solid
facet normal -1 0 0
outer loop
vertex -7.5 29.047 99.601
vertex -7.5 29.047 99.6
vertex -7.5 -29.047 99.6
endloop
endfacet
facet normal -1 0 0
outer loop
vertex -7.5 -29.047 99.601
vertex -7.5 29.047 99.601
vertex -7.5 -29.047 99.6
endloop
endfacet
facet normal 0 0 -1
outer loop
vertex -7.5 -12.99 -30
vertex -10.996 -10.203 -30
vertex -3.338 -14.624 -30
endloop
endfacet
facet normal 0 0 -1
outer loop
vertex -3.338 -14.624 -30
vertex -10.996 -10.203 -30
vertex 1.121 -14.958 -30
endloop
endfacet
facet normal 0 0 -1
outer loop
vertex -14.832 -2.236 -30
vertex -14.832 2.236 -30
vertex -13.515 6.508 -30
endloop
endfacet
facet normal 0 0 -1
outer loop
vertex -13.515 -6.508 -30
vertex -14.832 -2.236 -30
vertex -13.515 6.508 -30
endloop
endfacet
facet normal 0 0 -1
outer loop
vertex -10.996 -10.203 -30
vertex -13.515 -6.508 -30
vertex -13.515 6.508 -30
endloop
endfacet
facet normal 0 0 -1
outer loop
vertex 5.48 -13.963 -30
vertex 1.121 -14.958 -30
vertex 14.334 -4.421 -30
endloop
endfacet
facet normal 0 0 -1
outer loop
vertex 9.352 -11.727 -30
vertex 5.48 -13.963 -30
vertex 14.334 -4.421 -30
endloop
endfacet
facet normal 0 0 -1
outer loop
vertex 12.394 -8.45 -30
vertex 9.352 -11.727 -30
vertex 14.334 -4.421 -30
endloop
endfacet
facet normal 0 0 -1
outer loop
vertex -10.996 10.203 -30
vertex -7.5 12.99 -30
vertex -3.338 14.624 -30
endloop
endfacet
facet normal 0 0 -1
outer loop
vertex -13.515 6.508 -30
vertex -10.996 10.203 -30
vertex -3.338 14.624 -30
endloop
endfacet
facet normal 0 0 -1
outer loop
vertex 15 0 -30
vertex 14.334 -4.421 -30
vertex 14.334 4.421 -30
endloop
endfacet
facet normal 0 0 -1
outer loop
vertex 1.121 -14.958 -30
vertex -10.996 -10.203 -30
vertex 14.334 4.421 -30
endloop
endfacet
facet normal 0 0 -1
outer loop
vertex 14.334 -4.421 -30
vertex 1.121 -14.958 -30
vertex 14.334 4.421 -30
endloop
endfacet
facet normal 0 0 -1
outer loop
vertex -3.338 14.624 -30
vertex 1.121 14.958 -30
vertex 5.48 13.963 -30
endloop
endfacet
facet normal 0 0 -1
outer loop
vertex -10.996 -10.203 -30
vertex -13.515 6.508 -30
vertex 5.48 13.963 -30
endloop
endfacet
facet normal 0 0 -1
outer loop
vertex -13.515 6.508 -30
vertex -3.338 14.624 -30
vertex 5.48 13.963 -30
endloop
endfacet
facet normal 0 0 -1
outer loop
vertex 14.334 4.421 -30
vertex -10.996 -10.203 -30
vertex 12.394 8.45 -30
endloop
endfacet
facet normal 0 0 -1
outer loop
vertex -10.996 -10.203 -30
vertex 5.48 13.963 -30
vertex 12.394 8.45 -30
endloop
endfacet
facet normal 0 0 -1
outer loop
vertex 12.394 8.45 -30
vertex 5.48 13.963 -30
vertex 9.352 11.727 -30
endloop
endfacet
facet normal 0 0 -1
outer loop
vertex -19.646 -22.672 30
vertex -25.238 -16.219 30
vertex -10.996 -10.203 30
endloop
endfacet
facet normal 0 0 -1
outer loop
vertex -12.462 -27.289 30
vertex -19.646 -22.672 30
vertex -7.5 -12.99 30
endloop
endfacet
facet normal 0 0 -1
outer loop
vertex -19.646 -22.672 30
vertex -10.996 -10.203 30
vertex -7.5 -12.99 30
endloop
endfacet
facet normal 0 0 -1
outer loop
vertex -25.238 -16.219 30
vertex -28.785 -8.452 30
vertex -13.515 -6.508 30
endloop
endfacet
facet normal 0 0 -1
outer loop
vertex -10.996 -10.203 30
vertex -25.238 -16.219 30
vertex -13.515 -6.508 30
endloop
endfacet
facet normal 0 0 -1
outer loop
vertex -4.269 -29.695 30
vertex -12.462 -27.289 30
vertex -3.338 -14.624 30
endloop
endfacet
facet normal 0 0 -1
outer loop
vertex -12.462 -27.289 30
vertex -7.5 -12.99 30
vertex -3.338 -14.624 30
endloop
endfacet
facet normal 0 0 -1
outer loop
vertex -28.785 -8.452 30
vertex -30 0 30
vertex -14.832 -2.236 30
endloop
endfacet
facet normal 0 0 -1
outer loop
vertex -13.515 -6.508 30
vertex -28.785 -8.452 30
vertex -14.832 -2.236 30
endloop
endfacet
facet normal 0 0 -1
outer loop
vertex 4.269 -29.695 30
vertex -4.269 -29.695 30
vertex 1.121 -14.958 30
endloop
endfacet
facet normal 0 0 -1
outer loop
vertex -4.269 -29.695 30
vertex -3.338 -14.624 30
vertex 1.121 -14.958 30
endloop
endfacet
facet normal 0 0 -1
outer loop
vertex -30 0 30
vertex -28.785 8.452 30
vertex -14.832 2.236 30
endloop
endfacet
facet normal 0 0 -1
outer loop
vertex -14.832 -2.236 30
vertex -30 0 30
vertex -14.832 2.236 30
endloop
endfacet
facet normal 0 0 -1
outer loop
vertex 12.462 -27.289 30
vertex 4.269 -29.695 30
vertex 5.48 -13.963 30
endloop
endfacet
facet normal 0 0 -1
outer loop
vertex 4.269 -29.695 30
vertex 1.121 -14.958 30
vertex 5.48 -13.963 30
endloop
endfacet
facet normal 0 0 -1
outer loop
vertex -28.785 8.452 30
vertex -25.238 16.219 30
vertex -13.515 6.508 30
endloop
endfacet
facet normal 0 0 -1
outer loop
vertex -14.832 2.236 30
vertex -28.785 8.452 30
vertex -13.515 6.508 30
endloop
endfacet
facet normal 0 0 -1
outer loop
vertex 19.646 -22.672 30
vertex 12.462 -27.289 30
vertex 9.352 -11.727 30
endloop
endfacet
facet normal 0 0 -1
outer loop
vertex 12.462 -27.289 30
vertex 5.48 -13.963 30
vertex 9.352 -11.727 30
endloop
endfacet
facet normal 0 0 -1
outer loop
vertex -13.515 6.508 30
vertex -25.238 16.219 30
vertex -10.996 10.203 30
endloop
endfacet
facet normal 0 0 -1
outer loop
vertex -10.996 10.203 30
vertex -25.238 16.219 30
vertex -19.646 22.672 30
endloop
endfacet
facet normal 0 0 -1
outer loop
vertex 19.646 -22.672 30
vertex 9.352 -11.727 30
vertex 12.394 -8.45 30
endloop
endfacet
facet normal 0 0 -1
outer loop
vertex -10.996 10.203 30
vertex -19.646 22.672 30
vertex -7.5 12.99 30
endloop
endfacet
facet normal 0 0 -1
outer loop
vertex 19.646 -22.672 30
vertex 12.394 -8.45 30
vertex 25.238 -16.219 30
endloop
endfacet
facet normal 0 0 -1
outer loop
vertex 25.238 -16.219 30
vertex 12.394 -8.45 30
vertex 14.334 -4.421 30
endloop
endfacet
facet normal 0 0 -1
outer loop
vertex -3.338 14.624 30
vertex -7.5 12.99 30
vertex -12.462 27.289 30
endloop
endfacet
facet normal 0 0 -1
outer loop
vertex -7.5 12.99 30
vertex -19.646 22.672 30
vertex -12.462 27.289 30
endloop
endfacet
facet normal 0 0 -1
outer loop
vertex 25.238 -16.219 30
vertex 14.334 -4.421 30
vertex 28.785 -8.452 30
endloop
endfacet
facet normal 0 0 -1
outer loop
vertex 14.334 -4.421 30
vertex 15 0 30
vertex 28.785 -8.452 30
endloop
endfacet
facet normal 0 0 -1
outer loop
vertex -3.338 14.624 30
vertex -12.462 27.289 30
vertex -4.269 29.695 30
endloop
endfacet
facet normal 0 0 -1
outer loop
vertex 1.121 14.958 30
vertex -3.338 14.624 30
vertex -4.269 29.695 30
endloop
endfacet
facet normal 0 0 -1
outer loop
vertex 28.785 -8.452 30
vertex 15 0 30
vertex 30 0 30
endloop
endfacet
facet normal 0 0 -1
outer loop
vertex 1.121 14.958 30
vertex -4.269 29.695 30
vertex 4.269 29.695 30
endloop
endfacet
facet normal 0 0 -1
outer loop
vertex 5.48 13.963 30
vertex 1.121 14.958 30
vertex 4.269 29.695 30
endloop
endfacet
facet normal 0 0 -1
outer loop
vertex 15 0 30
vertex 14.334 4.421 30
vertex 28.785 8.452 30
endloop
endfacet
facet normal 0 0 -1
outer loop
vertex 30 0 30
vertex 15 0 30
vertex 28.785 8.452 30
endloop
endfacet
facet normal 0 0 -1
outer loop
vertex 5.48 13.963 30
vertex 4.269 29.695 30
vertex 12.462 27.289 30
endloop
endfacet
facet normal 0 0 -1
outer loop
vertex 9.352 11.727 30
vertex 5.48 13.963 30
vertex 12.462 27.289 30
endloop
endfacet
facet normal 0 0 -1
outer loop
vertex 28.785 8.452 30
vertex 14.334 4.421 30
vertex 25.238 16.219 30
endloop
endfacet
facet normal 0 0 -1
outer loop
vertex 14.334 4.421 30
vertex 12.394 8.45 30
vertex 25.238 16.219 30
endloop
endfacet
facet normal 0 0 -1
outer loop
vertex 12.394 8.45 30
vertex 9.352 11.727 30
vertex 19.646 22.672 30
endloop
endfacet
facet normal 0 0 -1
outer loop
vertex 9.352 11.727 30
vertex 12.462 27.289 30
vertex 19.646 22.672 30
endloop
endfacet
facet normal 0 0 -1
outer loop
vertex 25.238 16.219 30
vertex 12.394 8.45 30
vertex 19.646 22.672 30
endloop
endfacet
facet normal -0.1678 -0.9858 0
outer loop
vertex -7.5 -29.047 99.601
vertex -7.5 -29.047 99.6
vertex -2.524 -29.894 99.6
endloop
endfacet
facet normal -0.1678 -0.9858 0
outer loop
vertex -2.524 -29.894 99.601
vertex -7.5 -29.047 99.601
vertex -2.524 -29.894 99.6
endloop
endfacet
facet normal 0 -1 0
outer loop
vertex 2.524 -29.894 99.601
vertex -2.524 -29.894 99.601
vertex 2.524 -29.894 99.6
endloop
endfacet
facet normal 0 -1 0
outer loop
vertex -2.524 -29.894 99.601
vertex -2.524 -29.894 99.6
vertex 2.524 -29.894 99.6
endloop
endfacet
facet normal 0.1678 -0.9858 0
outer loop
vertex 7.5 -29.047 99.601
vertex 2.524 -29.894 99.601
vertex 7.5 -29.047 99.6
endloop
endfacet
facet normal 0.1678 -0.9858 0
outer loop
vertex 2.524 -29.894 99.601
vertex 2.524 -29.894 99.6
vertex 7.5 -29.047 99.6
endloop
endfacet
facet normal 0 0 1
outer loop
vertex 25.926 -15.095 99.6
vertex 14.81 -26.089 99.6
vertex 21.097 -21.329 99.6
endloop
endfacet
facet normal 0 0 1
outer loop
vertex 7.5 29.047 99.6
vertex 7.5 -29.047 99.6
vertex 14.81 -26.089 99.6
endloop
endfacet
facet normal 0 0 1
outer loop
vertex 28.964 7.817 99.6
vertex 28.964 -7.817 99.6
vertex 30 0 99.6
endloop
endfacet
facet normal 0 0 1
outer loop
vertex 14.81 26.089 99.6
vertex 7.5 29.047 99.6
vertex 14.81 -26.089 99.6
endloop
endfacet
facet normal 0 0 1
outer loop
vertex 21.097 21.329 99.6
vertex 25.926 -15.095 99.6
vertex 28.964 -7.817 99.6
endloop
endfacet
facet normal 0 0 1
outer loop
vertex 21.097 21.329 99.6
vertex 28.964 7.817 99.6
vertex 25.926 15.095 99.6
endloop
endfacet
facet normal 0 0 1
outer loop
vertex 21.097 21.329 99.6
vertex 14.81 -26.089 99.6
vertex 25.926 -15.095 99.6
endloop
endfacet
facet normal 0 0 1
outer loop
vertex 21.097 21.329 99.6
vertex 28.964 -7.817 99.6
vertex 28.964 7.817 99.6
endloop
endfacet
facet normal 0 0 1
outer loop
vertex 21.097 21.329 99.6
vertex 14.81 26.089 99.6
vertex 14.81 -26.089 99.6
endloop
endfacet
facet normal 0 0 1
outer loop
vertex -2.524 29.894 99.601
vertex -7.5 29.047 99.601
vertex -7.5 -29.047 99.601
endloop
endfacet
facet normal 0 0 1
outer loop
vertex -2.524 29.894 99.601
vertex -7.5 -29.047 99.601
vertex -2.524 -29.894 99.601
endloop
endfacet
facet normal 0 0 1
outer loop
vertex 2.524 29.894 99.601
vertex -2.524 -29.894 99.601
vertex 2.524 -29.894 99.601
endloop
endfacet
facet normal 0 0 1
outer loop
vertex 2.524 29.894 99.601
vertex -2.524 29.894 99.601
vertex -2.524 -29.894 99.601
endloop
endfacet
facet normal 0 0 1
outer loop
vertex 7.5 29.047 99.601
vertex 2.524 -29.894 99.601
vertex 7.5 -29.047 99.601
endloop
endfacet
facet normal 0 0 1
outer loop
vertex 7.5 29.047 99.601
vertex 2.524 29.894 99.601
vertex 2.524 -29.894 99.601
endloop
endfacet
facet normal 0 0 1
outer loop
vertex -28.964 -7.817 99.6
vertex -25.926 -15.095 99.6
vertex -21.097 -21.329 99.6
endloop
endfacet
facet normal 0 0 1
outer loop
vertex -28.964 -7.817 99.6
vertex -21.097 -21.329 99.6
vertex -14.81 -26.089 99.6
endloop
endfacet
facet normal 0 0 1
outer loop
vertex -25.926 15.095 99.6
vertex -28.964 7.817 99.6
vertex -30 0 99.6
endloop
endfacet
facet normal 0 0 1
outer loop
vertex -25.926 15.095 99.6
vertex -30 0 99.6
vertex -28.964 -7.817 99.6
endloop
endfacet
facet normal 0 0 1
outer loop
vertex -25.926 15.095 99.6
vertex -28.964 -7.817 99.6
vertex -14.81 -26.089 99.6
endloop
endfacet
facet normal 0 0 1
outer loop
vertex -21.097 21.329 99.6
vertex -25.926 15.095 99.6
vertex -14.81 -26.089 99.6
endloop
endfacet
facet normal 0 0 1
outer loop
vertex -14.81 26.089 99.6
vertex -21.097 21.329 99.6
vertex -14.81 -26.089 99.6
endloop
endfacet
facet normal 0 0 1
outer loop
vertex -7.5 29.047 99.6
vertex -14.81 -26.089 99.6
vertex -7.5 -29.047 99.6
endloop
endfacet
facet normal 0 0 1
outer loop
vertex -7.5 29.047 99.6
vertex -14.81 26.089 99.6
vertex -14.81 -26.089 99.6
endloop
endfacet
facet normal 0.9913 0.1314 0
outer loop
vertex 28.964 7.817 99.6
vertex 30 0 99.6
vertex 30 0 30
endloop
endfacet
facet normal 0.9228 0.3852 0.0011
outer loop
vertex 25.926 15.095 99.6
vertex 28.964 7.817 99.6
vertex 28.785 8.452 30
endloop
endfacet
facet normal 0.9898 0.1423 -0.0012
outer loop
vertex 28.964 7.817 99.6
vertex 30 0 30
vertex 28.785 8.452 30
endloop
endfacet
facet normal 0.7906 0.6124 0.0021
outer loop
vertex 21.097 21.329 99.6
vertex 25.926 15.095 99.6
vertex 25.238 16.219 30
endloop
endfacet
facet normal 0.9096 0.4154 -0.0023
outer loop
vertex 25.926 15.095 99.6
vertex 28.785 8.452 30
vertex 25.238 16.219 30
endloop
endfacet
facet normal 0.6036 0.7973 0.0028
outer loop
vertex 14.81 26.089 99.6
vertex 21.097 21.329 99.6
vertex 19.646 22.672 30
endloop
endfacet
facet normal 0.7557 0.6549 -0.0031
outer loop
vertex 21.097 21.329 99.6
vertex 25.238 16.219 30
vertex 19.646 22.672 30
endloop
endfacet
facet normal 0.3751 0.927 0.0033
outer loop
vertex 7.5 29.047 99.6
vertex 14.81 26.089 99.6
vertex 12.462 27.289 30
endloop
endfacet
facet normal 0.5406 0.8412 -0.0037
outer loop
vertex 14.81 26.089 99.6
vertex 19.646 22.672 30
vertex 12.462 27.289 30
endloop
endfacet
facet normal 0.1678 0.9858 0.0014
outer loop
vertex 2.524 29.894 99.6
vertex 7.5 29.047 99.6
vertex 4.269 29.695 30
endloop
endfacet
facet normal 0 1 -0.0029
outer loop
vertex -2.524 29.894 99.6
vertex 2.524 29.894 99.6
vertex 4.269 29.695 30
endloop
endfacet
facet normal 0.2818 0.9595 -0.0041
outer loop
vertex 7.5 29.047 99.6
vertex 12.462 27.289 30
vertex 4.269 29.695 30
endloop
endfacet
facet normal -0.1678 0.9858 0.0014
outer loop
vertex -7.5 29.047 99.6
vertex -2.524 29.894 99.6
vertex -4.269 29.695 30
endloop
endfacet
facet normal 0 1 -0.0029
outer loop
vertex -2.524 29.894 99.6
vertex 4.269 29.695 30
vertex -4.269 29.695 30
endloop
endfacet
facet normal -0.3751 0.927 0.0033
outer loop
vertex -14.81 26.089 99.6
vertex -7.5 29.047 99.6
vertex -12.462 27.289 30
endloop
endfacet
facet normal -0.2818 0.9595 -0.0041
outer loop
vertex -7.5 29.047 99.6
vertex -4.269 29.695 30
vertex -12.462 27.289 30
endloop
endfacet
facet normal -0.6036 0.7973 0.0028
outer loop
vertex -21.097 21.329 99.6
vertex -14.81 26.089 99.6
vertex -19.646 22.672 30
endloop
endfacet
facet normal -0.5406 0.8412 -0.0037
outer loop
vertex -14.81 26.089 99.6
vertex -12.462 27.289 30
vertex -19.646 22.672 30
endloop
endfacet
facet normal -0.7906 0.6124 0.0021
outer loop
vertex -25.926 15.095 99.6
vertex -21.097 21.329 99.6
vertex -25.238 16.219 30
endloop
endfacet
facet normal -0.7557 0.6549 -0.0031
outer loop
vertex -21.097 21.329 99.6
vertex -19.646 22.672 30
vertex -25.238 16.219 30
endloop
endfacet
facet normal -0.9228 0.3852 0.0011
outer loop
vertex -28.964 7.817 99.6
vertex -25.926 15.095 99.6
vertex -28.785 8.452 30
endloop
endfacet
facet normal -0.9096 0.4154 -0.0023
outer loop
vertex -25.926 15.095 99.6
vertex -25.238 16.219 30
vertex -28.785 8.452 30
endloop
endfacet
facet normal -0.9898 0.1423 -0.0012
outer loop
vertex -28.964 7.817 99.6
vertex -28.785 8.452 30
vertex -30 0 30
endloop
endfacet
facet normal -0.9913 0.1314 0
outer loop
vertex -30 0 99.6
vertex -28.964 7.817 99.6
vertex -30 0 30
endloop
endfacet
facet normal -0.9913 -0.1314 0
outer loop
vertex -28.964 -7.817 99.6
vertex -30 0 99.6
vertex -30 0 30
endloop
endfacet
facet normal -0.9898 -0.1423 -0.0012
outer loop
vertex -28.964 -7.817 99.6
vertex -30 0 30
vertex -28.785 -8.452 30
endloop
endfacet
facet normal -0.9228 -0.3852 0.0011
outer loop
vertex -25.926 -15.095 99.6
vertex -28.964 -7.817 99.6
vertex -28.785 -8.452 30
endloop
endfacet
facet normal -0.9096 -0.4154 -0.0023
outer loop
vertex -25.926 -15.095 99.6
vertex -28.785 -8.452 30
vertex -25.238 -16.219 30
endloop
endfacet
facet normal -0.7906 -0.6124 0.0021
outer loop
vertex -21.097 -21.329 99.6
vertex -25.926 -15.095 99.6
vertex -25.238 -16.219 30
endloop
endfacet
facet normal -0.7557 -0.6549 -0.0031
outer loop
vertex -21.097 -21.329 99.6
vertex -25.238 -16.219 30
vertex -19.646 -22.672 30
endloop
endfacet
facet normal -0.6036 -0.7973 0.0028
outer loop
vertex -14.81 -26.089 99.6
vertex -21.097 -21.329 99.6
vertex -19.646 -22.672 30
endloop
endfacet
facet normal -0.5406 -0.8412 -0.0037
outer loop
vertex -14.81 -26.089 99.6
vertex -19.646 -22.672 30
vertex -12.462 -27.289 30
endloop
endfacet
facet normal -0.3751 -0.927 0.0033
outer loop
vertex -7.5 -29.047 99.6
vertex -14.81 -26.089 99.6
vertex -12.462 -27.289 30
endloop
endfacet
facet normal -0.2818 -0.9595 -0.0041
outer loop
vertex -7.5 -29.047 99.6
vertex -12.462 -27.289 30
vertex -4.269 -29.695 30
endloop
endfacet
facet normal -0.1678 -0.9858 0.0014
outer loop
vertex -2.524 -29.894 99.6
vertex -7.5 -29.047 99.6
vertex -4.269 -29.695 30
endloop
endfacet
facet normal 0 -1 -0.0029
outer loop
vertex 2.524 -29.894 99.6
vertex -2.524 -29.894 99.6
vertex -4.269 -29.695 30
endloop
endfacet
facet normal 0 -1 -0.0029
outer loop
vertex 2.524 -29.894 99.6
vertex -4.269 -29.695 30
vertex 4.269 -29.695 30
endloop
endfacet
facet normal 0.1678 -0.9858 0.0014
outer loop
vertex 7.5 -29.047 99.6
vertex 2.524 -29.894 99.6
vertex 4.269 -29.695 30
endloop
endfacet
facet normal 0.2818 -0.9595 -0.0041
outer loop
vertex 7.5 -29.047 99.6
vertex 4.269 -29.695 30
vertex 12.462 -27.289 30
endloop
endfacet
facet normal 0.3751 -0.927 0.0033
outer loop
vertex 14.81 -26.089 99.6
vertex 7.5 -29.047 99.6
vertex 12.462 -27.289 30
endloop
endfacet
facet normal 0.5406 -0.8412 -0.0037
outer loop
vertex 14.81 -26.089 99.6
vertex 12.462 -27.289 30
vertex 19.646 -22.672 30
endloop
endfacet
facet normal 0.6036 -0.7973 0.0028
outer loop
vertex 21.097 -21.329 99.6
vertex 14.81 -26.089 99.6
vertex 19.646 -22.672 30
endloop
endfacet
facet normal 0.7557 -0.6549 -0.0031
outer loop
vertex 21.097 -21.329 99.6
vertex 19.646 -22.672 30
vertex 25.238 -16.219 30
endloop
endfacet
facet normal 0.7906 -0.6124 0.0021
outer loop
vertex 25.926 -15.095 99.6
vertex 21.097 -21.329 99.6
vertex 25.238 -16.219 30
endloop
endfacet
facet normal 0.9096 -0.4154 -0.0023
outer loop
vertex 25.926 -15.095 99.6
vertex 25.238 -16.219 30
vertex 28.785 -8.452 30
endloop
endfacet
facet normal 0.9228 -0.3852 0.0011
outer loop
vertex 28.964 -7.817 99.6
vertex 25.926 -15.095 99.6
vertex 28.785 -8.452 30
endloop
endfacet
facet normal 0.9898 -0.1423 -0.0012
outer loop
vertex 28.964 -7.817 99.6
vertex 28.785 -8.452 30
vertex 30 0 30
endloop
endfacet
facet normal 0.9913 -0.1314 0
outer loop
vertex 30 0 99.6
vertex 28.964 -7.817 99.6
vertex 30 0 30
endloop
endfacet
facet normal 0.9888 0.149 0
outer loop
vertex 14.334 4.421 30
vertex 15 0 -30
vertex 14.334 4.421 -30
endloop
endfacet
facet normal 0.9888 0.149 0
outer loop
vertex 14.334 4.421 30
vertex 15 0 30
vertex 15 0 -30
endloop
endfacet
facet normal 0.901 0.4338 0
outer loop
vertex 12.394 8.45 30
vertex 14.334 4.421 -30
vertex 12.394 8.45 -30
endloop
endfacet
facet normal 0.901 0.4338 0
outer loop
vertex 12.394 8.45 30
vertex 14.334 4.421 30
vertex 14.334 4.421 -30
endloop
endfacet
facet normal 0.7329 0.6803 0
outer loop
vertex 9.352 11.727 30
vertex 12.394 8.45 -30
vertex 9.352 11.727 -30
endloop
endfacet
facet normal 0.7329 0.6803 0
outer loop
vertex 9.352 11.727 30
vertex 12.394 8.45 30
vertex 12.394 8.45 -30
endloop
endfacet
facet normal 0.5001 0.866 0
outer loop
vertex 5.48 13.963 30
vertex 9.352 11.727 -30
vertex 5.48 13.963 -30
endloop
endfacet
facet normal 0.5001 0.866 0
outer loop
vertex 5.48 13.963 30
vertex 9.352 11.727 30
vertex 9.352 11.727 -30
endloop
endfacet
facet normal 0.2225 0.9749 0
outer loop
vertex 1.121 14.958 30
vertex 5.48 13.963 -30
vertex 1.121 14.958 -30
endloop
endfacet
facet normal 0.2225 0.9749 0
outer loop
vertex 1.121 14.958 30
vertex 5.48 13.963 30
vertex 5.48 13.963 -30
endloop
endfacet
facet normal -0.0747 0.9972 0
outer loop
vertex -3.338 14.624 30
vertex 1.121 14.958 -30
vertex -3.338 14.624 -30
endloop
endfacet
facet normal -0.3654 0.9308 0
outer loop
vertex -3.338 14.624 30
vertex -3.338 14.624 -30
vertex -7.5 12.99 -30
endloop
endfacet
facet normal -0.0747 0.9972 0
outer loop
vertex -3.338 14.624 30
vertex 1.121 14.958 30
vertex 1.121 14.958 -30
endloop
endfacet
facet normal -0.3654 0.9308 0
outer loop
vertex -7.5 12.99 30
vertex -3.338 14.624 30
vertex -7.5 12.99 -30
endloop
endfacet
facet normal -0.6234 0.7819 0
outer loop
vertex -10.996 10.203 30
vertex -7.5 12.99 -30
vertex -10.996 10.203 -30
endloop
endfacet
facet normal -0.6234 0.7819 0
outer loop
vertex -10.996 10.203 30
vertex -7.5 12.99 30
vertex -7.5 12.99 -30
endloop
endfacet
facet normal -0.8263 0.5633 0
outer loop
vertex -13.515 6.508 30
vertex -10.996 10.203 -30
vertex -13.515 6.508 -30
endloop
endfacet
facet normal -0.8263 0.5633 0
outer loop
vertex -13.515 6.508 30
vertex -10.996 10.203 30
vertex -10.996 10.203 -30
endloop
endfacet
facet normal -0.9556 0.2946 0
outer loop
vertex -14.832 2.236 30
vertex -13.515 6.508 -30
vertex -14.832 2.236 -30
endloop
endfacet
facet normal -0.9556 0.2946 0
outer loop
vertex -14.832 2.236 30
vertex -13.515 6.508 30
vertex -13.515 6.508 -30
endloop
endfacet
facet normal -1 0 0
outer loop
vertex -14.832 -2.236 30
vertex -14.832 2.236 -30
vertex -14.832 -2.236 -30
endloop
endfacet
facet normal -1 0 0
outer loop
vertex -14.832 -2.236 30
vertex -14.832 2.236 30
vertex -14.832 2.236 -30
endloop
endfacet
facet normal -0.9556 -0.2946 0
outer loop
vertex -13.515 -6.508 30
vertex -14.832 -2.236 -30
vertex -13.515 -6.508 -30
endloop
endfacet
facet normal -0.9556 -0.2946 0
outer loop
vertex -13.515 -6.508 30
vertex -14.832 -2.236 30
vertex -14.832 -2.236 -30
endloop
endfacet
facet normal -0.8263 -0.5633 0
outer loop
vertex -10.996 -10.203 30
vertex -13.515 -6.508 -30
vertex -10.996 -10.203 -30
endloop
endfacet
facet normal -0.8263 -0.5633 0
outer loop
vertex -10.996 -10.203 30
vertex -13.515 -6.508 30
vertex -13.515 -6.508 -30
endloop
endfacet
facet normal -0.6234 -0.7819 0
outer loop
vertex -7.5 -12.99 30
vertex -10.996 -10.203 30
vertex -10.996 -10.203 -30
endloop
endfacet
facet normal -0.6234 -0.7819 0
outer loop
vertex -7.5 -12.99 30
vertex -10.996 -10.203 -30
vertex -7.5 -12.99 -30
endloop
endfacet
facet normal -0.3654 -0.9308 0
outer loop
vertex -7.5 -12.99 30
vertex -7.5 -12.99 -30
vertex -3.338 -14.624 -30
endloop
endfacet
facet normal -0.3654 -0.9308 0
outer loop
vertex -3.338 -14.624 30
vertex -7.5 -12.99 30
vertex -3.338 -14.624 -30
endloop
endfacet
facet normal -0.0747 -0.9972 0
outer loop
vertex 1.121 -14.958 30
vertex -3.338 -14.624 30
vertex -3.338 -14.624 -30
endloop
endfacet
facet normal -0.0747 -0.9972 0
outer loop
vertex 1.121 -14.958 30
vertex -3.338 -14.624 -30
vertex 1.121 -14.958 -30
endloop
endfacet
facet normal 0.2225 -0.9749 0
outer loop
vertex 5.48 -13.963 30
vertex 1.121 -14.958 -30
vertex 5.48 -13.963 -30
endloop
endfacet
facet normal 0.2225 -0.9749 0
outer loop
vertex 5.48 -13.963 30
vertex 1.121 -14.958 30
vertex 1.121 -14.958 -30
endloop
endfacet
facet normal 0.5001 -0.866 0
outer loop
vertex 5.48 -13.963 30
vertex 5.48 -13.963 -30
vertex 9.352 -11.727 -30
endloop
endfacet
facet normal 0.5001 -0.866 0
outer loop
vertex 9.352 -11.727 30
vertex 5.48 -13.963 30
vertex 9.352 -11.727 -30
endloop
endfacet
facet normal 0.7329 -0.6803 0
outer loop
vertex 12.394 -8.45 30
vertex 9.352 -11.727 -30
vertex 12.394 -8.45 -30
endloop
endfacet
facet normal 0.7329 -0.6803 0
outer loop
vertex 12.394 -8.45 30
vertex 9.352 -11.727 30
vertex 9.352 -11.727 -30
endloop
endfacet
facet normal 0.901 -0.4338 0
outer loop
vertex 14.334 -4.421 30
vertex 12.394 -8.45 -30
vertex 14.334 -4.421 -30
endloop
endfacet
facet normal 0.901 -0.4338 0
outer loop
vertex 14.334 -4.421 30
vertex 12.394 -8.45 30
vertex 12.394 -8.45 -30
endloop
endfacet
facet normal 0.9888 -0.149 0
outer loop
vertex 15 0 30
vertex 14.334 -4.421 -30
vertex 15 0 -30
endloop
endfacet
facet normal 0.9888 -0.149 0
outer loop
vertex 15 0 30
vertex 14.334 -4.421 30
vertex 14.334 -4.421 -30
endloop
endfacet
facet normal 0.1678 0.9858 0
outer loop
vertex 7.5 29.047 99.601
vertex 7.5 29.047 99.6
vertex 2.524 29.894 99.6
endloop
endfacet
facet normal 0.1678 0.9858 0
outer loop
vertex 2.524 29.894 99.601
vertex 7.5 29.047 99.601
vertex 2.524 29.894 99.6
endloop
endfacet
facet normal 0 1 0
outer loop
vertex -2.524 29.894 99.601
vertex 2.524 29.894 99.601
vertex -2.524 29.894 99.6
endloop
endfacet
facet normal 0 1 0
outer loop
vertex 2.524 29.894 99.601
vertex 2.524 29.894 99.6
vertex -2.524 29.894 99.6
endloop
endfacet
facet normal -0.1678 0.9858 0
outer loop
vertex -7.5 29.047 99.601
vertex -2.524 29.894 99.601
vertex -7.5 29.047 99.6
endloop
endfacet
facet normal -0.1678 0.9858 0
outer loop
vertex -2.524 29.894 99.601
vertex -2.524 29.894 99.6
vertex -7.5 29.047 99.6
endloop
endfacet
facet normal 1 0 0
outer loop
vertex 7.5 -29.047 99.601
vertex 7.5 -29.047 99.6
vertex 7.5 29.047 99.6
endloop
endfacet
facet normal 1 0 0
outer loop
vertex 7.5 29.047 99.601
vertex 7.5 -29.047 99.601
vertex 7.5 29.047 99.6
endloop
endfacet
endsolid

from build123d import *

# Parameters (mm, degrees)
SKETCH1_LINK6_R     = 15
BOSS_EXTRUDE1_DEPTH = 30
SKETCH2_LINK6_R     = 30
BOSS_EXTRUDE2_DEPTH = 69.6
BOSS_EXTRUDE3_DEPTH = 0.001


with BuildPart() as part:
    # sketch1_link6 → Boss-Extrude1 (new body, symmetric)
    with BuildSketch(Plane.XY):
        Circle(SKETCH1_LINK6_R)
    extrude(amount=BOSS_EXTRUDE1_DEPTH, both=True)

    # sketch2_link6 → Boss-Extrude2 (add)
    with BuildSketch(Plane.XY.offset(30)):
        Circle(SKETCH2_LINK6_R)
    extrude(amount=BOSS_EXTRUDE2_DEPTH)

    # sketch3_link6 → Boss-Extrude3 (add)
    with BuildSketch(Plane.XY.offset(99.6)):
        with BuildLine():
            Line((-7.5, 29.047375097), (-7.5, -29.047375097))
            ThreePointArc((-7.5, -29.047375097), (0, -30), (7.5, -29.047375097))
            Line((7.5, -29.047375097), (7.5, 29.047375097))
            ThreePointArc((7.5, 29.047375097), (0, 30), (-7.5, 29.047375097))
        make_face()
    extrude(amount=BOSS_EXTRUDE3_DEPTH)


solid = part.part
